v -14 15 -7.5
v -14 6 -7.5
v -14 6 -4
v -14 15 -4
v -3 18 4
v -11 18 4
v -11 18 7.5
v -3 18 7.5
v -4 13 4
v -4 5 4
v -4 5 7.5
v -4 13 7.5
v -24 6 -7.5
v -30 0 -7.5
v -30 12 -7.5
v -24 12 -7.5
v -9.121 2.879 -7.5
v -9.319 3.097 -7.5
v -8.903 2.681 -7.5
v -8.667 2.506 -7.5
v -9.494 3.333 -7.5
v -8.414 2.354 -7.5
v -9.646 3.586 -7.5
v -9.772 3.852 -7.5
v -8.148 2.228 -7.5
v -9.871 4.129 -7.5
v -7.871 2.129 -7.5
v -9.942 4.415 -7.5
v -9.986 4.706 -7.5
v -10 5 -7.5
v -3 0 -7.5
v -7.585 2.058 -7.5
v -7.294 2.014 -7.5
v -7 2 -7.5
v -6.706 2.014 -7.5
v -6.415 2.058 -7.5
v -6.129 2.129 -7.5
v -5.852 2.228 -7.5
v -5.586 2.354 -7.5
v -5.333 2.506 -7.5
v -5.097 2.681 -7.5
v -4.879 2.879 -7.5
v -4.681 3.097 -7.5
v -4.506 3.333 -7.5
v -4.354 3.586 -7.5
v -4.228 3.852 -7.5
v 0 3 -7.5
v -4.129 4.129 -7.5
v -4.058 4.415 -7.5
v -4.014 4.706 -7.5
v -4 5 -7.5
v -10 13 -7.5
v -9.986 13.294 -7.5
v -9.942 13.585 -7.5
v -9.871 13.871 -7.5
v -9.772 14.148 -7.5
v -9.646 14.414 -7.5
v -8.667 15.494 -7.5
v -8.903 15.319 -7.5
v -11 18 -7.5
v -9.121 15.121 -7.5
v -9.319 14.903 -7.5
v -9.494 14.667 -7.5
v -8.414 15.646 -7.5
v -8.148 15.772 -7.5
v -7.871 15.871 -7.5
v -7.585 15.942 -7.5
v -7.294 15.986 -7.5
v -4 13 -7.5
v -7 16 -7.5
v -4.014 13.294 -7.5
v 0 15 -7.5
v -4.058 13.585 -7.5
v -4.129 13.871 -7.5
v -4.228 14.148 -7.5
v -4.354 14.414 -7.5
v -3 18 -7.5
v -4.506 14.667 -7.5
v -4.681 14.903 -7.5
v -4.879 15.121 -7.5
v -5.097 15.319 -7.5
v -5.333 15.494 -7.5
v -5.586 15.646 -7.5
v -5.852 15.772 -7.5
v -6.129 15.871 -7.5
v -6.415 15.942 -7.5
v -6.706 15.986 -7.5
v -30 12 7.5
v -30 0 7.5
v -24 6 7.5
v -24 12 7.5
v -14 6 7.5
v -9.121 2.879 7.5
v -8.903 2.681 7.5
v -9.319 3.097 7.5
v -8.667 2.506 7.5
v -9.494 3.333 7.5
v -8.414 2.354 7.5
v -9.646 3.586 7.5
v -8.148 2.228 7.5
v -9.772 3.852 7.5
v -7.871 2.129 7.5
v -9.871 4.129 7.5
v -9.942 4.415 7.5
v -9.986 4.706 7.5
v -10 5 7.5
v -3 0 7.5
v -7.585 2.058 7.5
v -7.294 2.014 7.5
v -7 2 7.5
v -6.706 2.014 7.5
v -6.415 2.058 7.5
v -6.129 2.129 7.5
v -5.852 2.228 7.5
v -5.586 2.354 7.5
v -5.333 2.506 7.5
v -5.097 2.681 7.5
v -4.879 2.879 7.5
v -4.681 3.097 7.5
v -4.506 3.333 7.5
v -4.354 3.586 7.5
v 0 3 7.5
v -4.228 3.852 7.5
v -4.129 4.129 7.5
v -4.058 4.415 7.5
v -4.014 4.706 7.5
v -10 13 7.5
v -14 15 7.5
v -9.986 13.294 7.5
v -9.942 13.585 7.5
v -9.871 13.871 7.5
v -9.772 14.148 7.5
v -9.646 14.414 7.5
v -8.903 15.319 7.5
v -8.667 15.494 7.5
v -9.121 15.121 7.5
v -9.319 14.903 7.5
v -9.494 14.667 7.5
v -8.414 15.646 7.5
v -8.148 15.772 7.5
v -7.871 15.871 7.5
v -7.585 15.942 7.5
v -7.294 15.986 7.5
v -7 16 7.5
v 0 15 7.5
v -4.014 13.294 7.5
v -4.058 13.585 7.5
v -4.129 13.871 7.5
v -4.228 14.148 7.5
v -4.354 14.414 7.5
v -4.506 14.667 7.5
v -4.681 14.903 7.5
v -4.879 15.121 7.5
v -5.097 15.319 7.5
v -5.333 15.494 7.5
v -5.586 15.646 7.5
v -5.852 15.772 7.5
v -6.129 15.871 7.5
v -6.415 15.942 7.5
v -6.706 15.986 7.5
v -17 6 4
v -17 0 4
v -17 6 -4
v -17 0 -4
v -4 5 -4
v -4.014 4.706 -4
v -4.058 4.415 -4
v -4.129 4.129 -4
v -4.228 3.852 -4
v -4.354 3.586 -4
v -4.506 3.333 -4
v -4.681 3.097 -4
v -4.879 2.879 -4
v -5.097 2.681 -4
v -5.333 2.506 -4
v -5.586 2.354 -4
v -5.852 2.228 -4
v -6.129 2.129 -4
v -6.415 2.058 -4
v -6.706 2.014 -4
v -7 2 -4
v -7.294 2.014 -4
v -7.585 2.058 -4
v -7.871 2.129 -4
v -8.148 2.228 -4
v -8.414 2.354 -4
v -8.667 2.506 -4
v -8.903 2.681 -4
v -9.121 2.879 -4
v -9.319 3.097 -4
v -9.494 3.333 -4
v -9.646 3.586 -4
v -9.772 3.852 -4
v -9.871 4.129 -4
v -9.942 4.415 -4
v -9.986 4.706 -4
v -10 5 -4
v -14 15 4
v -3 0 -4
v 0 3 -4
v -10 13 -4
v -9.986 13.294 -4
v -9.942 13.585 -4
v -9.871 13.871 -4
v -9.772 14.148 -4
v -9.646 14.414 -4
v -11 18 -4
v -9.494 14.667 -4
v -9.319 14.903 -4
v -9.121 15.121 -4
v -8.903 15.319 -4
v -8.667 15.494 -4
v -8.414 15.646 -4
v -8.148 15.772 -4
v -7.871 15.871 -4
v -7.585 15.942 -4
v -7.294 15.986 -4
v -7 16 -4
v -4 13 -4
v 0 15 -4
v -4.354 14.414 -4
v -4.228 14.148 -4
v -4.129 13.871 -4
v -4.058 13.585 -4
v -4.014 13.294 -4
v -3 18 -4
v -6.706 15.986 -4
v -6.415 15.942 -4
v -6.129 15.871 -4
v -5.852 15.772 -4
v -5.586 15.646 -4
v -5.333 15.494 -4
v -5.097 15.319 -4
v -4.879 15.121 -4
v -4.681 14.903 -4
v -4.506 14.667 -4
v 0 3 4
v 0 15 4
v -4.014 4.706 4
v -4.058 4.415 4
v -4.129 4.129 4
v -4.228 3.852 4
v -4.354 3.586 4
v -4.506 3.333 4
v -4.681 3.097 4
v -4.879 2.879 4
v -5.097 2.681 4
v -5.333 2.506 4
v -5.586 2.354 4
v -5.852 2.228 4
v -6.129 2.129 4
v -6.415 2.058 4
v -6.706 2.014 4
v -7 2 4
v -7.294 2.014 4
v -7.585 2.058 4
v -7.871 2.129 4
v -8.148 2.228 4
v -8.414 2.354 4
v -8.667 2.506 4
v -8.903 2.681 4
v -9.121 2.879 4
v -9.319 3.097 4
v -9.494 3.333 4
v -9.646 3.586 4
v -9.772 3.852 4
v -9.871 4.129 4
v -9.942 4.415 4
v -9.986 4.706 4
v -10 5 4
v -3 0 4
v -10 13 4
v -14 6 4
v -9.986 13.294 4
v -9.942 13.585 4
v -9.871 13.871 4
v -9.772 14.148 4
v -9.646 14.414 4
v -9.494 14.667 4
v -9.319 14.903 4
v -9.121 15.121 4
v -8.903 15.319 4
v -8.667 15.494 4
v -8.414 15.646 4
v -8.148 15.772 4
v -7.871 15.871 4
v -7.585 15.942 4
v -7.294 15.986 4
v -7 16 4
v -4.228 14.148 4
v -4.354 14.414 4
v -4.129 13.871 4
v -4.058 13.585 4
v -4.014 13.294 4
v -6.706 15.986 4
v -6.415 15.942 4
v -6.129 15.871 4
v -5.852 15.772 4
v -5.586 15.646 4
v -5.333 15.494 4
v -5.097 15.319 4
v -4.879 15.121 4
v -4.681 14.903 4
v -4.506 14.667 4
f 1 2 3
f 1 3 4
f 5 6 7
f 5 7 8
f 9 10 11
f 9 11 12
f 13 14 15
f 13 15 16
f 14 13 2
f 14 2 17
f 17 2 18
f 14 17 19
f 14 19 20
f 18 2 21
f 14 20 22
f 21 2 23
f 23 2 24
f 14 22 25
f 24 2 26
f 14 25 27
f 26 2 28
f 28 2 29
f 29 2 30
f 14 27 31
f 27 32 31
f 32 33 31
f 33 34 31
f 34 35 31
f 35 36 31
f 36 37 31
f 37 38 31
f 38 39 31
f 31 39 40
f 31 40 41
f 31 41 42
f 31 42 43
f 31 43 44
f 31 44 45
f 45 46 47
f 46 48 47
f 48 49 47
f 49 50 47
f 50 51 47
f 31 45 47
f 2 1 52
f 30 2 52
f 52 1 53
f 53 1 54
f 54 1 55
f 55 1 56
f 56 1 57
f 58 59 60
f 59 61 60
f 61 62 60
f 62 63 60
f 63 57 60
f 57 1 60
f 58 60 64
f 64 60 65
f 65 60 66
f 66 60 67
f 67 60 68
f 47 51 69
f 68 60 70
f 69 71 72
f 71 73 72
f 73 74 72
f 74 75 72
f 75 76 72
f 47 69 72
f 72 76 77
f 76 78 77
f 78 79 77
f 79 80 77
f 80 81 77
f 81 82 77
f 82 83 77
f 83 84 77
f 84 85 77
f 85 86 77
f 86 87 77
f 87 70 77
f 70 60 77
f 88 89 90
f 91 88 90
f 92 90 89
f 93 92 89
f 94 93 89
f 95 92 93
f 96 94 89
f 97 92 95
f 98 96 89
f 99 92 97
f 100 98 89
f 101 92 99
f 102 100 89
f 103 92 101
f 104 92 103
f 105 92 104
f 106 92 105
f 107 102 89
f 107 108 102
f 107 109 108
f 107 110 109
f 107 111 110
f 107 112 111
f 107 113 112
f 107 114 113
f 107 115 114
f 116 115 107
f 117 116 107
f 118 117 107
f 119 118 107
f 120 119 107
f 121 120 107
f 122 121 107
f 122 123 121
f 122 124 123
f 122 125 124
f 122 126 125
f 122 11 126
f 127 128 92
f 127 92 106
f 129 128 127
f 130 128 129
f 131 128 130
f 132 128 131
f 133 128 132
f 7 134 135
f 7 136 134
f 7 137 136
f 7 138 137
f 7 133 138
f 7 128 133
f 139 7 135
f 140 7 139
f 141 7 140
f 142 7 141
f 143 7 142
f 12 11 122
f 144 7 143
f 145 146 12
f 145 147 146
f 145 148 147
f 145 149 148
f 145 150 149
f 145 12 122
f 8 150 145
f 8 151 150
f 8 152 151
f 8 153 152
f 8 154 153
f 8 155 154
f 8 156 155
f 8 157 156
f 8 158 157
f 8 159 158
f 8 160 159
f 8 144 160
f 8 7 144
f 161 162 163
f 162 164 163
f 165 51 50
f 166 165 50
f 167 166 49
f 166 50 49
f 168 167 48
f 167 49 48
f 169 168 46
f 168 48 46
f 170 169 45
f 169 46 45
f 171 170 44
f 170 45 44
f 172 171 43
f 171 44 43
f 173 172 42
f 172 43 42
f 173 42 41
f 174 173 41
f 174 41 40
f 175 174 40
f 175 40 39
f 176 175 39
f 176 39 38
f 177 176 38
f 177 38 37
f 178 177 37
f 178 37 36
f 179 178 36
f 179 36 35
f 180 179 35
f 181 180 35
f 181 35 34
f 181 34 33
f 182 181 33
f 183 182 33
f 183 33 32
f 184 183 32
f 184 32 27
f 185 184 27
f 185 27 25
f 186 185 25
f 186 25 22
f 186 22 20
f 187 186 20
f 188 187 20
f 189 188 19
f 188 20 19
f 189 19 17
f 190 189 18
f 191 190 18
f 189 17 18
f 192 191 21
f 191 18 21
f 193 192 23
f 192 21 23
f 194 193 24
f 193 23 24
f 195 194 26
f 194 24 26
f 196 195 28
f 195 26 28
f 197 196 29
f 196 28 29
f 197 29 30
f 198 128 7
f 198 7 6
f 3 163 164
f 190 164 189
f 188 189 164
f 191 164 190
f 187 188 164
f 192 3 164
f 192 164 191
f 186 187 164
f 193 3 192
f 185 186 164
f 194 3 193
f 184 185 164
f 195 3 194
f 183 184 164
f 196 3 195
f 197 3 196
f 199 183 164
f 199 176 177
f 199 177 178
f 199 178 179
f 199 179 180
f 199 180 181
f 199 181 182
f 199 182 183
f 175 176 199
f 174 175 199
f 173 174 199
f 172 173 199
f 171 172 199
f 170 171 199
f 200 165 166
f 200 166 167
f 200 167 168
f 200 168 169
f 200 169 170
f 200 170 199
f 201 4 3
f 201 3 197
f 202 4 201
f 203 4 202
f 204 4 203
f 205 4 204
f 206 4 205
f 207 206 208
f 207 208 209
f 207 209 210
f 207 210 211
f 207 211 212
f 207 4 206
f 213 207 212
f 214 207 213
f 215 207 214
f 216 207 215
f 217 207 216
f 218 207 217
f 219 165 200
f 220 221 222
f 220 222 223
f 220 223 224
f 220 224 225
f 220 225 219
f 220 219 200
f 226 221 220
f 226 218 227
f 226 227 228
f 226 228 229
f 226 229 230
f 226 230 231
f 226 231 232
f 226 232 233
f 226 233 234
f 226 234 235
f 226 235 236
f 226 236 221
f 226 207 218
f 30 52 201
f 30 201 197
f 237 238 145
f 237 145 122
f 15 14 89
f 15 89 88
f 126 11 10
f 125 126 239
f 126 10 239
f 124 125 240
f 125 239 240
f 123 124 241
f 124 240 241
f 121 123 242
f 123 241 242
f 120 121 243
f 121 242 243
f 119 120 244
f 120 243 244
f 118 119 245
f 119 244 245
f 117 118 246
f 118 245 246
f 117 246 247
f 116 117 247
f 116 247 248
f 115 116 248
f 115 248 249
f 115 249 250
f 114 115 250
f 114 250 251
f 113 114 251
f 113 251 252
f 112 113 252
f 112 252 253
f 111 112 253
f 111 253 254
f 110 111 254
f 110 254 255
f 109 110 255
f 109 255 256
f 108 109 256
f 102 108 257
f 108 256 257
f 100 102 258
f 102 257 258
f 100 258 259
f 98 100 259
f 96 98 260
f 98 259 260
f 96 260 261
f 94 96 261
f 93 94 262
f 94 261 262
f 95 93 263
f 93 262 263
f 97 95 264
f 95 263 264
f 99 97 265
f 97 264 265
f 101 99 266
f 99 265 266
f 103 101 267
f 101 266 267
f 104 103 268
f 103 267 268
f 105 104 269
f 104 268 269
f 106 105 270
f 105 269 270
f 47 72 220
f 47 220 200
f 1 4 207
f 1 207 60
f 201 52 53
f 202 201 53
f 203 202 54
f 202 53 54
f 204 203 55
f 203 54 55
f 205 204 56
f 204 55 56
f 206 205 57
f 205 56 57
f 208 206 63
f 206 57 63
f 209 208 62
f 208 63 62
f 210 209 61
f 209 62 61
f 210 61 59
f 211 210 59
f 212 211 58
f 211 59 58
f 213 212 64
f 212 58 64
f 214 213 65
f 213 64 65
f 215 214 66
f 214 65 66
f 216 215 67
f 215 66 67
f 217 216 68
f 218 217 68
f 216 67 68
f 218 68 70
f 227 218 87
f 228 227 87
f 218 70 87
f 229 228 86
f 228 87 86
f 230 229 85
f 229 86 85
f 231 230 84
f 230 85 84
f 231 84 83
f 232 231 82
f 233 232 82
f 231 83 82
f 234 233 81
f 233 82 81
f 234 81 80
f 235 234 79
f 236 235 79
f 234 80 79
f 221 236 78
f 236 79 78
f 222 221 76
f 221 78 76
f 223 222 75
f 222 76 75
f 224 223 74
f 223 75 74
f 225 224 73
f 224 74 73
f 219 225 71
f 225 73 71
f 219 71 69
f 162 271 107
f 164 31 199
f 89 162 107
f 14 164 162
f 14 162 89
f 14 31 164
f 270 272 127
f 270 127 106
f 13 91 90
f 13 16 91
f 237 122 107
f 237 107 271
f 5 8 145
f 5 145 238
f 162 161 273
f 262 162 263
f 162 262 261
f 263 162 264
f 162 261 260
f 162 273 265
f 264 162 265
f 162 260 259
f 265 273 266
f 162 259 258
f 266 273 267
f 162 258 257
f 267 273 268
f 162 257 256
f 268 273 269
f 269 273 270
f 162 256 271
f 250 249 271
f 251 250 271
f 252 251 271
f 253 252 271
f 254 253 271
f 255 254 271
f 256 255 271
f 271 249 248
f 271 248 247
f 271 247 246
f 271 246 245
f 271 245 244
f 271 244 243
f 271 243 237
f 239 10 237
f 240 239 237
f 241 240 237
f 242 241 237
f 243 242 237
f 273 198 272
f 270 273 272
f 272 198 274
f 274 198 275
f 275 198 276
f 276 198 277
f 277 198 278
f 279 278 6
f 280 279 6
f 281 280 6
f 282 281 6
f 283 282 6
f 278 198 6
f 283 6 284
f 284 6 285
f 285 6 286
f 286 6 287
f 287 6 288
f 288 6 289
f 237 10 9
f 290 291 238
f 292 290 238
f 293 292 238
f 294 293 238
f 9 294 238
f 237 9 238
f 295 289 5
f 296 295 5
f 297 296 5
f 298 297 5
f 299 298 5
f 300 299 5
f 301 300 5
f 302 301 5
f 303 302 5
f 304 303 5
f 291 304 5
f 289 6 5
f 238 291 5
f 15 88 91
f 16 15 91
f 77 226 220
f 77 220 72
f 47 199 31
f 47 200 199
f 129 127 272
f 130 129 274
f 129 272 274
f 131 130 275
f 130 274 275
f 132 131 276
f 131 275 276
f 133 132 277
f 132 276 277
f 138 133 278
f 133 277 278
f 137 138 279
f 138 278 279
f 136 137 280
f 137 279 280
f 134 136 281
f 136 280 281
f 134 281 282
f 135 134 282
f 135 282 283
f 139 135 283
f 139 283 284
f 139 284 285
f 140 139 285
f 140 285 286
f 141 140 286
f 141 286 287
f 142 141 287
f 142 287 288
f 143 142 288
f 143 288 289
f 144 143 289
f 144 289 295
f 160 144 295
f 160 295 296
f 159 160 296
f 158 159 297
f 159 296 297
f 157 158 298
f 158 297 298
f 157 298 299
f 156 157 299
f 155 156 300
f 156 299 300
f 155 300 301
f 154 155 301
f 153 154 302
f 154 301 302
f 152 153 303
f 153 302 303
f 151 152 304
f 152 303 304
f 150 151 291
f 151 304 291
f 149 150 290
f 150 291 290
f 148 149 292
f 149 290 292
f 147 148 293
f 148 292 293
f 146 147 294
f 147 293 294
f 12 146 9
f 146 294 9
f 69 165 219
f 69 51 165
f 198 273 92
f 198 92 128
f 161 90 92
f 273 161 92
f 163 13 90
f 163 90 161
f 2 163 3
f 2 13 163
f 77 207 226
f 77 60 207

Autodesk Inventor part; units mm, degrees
ref_plane "YZ Plane" through (0, 0, 0) normal (1, 0, 0) x (0, 1, 0)
ref_plane "XZ Plane" through (0, 0, 0) normal (0, 1, 0) x (-1, 0, 0)
ref_plane "XY Plane" through (0, 0, 0) normal (0, 0, 1) x (1, 0, 0)
sketch "스케치1" plane through (0, 0, 0) normal (0, 0, 1) x (1, 0, 0)
  line L0 (0, 0) -> (-14, 0)
  line L1 (-14, 6) -> (-14, 18)
  line L2 (-14, 18) -> (0, 18)
  line L3 (0, 18) -> (0, 0)
  line L4 (-14, 0) -> (-30, 0)
  line L5 (-30, 0) -> (-30, 12)
  line L6 (-30, 12) -> (-24, 12)
  line L7 (-24, 12) -> (-24, 6)
  line L8 (-24, 6) -> (-14, 6)
  line L9 (-7, 13) -> (-7, 5) construction
  line L10 (-10, 13) -> (-10, 5)
  line L11 (-4, 5) -> (-4, 13)
  arc A0 (-4, 13) -> (-10, 13) centre (-7, 13) ccw
  arc A1 (-10, 5) -> (-4, 5) centre (-7, 5) ccw
  point P0 (-7, 9)
  dimension "d0" = 14
  dimension "d3" = 12
  dimension "d4" = 6
  dimension "d5" = 10
  dimension "d6" = 30
  dimension "d7" = 6
  dimension "d8" = 8
  dimension "d9" = 5
  dimension "d10" = 7
  dimension "d11" = 18
extrude "돌출1" add sketch "스케치1" along normal mid plane 15
chamfer "모따기1" distance 3 angle 45 3 edges at (-14, 18, 0) (0, 18, 0) (0, 0, 0)
sketch "스케치2" plane through (0, 0, 0) normal (0, 0, 1) x (1, 0, 0)
  line L0 (-17, 20.9368) -> (7.8455, 20.9368)
  line L1 (7.8455, 20.9368) -> (7.8455, -4.4634)
  line L2 (7.8455, -4.4634) -> (-17, -4.4634)
  line L3 (-17, -4.4634) -> (-17, 20.9368)
  line L4 (0, 15) -> (0, 3) projected
  point P0 (0, 0)
  dimension "d17" = 17
extrude "돌출2" cut sketch "스케치2" along normal mid plane 8
properties part number "14-2"
